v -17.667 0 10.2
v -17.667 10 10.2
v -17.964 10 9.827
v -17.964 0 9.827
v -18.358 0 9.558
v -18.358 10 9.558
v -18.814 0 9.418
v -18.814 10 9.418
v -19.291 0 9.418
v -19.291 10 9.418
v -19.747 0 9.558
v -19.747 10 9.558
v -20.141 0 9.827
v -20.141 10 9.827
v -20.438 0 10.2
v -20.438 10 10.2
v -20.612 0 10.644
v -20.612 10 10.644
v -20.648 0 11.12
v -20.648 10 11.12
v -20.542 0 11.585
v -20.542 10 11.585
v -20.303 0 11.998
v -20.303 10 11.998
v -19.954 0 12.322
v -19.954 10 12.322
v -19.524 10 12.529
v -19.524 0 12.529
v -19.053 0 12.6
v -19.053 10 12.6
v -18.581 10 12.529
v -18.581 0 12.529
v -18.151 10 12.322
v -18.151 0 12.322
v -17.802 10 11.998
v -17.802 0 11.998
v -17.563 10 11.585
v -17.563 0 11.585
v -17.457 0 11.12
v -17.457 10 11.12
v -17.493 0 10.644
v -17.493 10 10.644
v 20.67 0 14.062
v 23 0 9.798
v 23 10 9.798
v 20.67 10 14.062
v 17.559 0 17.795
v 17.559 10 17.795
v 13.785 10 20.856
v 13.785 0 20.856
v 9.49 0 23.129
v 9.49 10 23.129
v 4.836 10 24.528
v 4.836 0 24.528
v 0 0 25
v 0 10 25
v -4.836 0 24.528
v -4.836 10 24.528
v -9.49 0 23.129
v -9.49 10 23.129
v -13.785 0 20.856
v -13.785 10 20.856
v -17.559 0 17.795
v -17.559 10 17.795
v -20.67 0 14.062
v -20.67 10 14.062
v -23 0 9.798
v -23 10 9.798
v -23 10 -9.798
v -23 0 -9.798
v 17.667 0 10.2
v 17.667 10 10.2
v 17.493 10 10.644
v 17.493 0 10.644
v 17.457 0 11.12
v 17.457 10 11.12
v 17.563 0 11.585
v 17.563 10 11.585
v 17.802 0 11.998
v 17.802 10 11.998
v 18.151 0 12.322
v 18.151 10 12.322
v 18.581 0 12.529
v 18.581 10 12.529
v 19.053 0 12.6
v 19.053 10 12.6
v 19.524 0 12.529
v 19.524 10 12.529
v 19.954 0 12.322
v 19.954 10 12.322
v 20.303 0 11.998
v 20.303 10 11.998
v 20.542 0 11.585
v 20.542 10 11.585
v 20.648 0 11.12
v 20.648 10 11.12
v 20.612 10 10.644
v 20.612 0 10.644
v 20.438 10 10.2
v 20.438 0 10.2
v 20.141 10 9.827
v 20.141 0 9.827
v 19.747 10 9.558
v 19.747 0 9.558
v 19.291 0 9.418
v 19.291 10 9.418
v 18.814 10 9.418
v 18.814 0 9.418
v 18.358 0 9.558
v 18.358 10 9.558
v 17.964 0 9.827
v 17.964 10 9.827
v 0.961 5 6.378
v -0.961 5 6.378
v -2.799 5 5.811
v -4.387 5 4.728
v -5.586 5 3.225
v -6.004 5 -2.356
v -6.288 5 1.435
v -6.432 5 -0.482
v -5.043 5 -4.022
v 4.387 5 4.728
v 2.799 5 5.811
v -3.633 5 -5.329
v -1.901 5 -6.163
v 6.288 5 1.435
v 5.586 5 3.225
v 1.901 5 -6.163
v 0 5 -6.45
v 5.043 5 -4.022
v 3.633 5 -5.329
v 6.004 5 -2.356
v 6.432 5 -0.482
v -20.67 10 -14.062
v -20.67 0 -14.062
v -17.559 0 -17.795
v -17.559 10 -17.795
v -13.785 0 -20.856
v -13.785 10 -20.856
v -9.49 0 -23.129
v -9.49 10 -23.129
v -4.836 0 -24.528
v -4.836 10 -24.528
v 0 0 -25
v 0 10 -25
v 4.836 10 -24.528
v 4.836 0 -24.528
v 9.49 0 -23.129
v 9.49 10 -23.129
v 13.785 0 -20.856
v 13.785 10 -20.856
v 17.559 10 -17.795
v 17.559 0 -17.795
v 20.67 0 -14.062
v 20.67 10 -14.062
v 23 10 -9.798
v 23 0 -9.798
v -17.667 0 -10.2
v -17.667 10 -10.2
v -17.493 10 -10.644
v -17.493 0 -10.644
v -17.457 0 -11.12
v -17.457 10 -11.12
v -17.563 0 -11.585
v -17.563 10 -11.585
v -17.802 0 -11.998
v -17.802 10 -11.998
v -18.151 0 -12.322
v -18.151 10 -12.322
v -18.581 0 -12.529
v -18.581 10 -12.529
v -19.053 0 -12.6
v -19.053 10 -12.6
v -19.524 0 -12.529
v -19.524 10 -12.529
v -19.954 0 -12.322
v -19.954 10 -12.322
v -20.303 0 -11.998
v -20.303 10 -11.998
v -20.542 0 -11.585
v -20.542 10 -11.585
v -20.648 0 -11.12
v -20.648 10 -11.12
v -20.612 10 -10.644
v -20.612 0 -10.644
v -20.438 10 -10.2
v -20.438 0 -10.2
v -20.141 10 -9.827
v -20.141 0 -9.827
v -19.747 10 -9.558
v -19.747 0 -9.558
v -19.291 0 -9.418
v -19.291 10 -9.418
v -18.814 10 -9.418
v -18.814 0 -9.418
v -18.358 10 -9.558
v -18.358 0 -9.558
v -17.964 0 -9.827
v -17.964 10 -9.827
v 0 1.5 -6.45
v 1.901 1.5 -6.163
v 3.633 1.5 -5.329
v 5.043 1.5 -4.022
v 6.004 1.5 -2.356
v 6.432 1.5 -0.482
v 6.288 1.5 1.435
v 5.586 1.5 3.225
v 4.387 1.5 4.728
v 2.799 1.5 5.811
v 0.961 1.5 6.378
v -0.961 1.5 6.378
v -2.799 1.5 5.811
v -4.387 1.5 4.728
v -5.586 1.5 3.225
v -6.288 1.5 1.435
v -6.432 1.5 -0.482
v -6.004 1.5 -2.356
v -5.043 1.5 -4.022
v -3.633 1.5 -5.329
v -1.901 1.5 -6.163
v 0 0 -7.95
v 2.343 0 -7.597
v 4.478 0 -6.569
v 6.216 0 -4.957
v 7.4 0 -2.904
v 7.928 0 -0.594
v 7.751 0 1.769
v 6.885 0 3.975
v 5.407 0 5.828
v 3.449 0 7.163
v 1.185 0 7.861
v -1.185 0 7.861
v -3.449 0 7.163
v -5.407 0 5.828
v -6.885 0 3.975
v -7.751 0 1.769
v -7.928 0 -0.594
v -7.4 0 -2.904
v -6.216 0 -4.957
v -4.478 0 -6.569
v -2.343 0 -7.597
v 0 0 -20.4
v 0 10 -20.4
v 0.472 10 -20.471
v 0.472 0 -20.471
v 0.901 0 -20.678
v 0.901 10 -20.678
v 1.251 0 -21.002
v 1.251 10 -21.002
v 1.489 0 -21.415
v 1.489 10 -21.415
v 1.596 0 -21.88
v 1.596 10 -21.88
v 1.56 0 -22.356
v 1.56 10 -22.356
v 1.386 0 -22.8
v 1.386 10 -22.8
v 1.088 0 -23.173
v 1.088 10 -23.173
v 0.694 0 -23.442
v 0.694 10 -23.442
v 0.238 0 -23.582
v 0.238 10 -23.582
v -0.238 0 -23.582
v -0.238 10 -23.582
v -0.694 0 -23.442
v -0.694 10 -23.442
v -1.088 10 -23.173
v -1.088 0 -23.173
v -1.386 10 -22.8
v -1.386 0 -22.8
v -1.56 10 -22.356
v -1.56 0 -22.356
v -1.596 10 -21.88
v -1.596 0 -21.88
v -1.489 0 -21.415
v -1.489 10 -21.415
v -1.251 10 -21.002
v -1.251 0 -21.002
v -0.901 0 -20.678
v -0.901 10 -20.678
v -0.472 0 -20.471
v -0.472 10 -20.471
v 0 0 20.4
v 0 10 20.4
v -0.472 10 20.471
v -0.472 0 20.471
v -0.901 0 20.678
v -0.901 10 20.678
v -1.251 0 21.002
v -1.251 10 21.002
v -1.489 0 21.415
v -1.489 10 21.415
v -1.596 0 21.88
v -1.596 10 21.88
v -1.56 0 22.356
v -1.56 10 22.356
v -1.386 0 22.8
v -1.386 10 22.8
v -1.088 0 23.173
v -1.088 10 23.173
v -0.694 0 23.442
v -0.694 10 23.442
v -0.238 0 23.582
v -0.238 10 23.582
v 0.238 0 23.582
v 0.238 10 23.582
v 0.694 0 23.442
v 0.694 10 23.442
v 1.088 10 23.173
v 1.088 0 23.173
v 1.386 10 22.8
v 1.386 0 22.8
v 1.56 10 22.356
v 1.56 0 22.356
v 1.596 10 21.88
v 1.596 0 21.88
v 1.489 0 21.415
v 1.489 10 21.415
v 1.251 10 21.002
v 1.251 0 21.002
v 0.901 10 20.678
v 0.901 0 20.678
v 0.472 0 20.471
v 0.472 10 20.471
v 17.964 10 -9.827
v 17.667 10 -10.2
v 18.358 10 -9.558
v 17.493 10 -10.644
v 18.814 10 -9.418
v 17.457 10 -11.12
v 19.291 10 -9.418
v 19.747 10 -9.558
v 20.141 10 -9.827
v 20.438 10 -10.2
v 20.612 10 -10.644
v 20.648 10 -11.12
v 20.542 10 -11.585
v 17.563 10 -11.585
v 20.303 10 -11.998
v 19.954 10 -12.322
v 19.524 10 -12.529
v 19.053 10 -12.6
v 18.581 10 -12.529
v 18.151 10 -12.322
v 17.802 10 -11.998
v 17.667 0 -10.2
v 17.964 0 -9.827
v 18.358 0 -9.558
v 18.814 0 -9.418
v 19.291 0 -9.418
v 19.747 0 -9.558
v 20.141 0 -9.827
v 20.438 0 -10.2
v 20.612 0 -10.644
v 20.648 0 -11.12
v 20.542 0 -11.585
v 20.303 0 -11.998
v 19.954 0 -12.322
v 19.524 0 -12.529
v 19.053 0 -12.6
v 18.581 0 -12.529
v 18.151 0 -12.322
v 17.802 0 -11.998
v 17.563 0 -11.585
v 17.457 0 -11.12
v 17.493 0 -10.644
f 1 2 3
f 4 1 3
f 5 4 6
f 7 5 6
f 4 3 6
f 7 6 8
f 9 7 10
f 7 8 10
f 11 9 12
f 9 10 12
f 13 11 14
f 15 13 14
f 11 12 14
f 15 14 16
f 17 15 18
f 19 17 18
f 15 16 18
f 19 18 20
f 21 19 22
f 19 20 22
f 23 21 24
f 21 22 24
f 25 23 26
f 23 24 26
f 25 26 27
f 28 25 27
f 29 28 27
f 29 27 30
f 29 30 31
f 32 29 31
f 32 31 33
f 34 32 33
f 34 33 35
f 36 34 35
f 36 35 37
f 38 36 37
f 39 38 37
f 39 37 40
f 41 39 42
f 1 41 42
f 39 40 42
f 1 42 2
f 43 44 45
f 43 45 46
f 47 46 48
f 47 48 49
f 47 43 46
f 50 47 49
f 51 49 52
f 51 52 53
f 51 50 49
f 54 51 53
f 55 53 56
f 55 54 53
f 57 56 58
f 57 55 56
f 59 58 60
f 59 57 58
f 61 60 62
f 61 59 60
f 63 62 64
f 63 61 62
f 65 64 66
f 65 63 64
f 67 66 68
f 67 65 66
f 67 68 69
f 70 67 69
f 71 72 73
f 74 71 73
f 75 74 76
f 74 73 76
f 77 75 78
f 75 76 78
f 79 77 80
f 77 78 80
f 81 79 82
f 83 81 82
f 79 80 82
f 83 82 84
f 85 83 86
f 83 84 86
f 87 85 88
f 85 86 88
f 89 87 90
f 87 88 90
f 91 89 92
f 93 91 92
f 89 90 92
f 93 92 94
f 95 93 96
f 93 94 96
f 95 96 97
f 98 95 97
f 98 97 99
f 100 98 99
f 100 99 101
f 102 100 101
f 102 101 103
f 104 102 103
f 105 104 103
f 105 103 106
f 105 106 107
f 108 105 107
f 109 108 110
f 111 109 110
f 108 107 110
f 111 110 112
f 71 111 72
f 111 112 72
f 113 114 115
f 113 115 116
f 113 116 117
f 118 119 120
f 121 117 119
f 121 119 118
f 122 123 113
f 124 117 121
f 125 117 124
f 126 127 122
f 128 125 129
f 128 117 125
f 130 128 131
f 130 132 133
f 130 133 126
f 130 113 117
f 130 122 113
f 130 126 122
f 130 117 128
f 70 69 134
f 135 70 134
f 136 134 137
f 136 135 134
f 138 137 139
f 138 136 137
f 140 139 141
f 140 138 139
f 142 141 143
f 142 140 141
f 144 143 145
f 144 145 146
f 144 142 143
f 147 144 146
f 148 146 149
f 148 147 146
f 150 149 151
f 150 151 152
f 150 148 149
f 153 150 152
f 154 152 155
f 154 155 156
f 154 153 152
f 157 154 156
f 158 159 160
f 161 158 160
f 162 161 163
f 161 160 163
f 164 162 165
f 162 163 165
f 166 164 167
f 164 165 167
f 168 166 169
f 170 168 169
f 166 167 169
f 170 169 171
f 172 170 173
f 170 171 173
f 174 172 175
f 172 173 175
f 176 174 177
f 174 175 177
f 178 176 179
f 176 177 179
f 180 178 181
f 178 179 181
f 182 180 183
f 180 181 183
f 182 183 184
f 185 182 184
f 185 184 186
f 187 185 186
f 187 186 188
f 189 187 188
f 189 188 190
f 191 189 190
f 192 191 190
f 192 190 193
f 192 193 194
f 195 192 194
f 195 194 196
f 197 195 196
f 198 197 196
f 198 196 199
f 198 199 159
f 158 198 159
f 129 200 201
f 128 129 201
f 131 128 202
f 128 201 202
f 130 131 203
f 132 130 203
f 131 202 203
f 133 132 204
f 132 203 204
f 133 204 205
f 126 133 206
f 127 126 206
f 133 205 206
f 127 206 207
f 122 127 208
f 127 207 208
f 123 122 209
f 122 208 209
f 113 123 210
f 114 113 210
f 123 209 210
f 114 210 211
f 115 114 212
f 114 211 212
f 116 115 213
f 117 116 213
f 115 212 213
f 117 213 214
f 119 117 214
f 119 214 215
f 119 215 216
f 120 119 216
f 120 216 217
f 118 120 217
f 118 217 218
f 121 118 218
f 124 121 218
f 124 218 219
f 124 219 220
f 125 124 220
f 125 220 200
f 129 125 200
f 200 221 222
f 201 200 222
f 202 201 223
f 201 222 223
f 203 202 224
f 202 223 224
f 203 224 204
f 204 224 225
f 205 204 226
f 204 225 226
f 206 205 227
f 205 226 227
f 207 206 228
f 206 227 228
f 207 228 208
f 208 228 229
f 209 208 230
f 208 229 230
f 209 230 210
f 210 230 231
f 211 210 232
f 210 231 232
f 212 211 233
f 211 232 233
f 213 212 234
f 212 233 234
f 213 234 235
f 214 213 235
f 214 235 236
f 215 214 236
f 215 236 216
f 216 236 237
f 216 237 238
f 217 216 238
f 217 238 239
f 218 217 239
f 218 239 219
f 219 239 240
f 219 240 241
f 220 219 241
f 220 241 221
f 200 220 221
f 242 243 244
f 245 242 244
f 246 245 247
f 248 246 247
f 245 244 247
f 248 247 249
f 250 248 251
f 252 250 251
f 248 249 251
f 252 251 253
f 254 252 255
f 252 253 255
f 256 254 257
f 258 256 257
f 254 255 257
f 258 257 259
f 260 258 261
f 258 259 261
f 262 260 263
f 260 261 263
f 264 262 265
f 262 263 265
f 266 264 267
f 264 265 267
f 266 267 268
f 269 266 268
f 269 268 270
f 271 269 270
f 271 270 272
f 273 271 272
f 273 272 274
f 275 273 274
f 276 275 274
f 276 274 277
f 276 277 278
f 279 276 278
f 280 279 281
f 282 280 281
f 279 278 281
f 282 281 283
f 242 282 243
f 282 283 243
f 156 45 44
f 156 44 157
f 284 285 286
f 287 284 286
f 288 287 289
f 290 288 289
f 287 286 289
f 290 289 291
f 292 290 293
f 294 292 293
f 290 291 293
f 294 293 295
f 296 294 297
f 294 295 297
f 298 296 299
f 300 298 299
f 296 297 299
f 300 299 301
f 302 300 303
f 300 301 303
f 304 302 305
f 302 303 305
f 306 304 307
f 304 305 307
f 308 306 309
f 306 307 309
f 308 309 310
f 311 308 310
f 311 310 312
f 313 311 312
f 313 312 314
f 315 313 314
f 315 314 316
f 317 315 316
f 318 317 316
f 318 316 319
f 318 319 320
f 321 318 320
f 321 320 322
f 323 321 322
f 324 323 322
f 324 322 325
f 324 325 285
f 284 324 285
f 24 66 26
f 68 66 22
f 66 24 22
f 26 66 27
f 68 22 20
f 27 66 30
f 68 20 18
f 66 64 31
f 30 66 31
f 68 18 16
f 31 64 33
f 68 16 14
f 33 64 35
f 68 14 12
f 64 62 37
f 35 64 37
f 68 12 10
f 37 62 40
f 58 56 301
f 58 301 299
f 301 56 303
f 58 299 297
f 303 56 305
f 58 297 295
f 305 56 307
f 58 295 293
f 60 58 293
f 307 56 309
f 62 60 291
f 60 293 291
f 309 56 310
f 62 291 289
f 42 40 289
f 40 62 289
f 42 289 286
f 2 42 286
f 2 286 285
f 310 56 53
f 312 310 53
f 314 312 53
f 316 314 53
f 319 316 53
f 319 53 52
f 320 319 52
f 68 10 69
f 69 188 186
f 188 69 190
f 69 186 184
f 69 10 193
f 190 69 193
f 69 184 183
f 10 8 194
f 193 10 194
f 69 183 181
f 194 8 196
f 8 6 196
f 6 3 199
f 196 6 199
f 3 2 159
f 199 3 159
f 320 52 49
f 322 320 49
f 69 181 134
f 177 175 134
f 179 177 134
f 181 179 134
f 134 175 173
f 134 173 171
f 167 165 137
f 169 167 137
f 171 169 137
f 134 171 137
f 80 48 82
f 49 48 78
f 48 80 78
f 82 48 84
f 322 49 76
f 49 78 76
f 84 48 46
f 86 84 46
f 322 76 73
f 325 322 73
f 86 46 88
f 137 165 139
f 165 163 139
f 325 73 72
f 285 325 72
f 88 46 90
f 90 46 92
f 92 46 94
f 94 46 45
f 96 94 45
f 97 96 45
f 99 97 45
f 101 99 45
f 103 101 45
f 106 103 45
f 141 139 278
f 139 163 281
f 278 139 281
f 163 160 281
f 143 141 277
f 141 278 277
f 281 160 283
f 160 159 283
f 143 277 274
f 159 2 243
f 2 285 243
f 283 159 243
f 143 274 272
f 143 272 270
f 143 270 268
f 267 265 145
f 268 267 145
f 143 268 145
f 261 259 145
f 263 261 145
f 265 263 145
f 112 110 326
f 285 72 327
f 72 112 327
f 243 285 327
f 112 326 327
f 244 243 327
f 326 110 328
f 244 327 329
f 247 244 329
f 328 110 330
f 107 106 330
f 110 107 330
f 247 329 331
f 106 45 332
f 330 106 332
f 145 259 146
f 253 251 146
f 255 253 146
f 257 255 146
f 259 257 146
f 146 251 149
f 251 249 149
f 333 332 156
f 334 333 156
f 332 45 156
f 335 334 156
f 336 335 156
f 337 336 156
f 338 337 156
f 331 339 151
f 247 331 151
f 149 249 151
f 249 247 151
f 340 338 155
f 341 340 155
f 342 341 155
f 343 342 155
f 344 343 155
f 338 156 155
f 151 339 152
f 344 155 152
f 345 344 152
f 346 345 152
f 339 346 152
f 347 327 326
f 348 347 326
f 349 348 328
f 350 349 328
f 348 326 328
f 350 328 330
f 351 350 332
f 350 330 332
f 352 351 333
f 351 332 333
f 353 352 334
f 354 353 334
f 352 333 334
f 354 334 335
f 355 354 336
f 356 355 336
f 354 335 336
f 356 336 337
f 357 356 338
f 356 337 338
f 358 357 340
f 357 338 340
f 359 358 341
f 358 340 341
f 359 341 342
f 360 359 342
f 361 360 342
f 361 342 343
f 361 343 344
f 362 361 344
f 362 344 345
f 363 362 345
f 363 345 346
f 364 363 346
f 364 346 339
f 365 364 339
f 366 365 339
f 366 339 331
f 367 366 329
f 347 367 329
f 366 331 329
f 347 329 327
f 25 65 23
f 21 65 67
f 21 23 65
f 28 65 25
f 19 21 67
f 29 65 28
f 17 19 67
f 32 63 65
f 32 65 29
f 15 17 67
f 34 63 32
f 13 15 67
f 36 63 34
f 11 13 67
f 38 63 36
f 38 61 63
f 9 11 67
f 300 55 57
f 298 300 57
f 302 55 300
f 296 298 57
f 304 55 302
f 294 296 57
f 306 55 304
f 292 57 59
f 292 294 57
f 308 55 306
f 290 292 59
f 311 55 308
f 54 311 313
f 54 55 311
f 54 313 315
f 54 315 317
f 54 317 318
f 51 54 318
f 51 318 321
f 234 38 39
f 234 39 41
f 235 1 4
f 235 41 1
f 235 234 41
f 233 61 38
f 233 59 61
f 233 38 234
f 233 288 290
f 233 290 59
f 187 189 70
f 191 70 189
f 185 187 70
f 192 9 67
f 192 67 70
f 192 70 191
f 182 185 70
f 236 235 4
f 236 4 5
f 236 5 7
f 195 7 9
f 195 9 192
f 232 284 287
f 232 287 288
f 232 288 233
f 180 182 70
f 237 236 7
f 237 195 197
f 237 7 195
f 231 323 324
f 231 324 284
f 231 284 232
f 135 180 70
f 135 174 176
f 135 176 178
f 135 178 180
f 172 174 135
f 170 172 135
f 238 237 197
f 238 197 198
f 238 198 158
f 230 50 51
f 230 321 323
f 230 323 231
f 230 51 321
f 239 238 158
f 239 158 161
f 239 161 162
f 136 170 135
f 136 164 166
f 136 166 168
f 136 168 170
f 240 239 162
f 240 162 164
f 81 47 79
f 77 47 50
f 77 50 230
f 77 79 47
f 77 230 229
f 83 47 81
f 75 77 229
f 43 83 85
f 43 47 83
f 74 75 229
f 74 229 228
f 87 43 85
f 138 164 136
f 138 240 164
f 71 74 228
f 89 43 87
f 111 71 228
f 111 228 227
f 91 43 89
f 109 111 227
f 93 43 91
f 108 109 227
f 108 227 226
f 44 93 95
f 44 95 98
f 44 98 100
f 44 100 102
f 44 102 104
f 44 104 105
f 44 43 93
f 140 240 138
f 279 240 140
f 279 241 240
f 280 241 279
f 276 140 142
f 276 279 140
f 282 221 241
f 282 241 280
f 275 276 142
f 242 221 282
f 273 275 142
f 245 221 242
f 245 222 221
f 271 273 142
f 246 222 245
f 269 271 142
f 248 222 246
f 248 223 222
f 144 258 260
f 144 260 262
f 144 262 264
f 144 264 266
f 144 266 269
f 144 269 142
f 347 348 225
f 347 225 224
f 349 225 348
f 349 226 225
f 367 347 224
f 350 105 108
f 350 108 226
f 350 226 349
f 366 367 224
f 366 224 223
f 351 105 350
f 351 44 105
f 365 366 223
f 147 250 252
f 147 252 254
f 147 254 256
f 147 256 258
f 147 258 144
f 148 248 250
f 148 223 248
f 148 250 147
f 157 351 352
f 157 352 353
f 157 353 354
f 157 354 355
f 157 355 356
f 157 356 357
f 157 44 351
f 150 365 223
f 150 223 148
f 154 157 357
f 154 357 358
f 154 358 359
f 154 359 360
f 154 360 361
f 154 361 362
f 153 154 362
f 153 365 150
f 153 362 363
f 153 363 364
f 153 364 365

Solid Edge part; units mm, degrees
sketch "Sketch1" plane through (0, 0, 0) normal (0, -1, 0) x (1, 0, 0)
  circle A0 centre (0, 0) radius 25
extrude "Protrusion1" add sketch "Sketch1" against normal blind 10
sketch "Sketch2" plane through (0, 10, 0) normal (0, 1, 0) x (0, 0, 1)
  circle A0 centre (-22, 0) radius 1.6
  dimension "D1" = 22
extrude "Cutout1" cut sketch "Sketch2" against normal up to next
pattern_circular "Pattern1" count 6 over 360 about axis through (0, 10, 0) along (0, -1, 0) of "Cutout1"
sketch "Sketch3" plane through (0, 10, 0) normal (0, 1, 0) x (0, 0, 1)
  line L0 (-27.1295, -25) -> (30.6259, -25)
  line L1 (30.6259, -25) -> (30.6259, -23)
  line L2 (30.6259, -23) -> (-27.1295, -23)
  line L3 (-27.1295, -23) -> (-27.1295, -25)
  line L4 (-24.9621, 25) -> (24.2465, 25)
  line L5 (24.2465, 25) -> (24.2465, 23)
  line L6 (24.2465, 23) -> (-24.9621, 23)
  line L7 (-24.9621, 23) -> (-24.9621, 25)
  dimension "D1" = 2
  dimension "D2" = 25
  dimension "D3" = 2
  dimension "D4" = 25
extrude "Cutout2" cut sketch "Sketch3" against normal up to next
sketch "Sketch4" plane through (0, 0, 0) normal (0, -1, 0) x (0, 0, -1)
  circle A0 centre (0, 0) radius 6.45
extrude "ExtrudedCutout_3" cut sketch "Sketch4" against normal blind 5
chamfer "Chamfer_1" distance 1.5 angle 45 1 edges at (0, 0, 6.45)
